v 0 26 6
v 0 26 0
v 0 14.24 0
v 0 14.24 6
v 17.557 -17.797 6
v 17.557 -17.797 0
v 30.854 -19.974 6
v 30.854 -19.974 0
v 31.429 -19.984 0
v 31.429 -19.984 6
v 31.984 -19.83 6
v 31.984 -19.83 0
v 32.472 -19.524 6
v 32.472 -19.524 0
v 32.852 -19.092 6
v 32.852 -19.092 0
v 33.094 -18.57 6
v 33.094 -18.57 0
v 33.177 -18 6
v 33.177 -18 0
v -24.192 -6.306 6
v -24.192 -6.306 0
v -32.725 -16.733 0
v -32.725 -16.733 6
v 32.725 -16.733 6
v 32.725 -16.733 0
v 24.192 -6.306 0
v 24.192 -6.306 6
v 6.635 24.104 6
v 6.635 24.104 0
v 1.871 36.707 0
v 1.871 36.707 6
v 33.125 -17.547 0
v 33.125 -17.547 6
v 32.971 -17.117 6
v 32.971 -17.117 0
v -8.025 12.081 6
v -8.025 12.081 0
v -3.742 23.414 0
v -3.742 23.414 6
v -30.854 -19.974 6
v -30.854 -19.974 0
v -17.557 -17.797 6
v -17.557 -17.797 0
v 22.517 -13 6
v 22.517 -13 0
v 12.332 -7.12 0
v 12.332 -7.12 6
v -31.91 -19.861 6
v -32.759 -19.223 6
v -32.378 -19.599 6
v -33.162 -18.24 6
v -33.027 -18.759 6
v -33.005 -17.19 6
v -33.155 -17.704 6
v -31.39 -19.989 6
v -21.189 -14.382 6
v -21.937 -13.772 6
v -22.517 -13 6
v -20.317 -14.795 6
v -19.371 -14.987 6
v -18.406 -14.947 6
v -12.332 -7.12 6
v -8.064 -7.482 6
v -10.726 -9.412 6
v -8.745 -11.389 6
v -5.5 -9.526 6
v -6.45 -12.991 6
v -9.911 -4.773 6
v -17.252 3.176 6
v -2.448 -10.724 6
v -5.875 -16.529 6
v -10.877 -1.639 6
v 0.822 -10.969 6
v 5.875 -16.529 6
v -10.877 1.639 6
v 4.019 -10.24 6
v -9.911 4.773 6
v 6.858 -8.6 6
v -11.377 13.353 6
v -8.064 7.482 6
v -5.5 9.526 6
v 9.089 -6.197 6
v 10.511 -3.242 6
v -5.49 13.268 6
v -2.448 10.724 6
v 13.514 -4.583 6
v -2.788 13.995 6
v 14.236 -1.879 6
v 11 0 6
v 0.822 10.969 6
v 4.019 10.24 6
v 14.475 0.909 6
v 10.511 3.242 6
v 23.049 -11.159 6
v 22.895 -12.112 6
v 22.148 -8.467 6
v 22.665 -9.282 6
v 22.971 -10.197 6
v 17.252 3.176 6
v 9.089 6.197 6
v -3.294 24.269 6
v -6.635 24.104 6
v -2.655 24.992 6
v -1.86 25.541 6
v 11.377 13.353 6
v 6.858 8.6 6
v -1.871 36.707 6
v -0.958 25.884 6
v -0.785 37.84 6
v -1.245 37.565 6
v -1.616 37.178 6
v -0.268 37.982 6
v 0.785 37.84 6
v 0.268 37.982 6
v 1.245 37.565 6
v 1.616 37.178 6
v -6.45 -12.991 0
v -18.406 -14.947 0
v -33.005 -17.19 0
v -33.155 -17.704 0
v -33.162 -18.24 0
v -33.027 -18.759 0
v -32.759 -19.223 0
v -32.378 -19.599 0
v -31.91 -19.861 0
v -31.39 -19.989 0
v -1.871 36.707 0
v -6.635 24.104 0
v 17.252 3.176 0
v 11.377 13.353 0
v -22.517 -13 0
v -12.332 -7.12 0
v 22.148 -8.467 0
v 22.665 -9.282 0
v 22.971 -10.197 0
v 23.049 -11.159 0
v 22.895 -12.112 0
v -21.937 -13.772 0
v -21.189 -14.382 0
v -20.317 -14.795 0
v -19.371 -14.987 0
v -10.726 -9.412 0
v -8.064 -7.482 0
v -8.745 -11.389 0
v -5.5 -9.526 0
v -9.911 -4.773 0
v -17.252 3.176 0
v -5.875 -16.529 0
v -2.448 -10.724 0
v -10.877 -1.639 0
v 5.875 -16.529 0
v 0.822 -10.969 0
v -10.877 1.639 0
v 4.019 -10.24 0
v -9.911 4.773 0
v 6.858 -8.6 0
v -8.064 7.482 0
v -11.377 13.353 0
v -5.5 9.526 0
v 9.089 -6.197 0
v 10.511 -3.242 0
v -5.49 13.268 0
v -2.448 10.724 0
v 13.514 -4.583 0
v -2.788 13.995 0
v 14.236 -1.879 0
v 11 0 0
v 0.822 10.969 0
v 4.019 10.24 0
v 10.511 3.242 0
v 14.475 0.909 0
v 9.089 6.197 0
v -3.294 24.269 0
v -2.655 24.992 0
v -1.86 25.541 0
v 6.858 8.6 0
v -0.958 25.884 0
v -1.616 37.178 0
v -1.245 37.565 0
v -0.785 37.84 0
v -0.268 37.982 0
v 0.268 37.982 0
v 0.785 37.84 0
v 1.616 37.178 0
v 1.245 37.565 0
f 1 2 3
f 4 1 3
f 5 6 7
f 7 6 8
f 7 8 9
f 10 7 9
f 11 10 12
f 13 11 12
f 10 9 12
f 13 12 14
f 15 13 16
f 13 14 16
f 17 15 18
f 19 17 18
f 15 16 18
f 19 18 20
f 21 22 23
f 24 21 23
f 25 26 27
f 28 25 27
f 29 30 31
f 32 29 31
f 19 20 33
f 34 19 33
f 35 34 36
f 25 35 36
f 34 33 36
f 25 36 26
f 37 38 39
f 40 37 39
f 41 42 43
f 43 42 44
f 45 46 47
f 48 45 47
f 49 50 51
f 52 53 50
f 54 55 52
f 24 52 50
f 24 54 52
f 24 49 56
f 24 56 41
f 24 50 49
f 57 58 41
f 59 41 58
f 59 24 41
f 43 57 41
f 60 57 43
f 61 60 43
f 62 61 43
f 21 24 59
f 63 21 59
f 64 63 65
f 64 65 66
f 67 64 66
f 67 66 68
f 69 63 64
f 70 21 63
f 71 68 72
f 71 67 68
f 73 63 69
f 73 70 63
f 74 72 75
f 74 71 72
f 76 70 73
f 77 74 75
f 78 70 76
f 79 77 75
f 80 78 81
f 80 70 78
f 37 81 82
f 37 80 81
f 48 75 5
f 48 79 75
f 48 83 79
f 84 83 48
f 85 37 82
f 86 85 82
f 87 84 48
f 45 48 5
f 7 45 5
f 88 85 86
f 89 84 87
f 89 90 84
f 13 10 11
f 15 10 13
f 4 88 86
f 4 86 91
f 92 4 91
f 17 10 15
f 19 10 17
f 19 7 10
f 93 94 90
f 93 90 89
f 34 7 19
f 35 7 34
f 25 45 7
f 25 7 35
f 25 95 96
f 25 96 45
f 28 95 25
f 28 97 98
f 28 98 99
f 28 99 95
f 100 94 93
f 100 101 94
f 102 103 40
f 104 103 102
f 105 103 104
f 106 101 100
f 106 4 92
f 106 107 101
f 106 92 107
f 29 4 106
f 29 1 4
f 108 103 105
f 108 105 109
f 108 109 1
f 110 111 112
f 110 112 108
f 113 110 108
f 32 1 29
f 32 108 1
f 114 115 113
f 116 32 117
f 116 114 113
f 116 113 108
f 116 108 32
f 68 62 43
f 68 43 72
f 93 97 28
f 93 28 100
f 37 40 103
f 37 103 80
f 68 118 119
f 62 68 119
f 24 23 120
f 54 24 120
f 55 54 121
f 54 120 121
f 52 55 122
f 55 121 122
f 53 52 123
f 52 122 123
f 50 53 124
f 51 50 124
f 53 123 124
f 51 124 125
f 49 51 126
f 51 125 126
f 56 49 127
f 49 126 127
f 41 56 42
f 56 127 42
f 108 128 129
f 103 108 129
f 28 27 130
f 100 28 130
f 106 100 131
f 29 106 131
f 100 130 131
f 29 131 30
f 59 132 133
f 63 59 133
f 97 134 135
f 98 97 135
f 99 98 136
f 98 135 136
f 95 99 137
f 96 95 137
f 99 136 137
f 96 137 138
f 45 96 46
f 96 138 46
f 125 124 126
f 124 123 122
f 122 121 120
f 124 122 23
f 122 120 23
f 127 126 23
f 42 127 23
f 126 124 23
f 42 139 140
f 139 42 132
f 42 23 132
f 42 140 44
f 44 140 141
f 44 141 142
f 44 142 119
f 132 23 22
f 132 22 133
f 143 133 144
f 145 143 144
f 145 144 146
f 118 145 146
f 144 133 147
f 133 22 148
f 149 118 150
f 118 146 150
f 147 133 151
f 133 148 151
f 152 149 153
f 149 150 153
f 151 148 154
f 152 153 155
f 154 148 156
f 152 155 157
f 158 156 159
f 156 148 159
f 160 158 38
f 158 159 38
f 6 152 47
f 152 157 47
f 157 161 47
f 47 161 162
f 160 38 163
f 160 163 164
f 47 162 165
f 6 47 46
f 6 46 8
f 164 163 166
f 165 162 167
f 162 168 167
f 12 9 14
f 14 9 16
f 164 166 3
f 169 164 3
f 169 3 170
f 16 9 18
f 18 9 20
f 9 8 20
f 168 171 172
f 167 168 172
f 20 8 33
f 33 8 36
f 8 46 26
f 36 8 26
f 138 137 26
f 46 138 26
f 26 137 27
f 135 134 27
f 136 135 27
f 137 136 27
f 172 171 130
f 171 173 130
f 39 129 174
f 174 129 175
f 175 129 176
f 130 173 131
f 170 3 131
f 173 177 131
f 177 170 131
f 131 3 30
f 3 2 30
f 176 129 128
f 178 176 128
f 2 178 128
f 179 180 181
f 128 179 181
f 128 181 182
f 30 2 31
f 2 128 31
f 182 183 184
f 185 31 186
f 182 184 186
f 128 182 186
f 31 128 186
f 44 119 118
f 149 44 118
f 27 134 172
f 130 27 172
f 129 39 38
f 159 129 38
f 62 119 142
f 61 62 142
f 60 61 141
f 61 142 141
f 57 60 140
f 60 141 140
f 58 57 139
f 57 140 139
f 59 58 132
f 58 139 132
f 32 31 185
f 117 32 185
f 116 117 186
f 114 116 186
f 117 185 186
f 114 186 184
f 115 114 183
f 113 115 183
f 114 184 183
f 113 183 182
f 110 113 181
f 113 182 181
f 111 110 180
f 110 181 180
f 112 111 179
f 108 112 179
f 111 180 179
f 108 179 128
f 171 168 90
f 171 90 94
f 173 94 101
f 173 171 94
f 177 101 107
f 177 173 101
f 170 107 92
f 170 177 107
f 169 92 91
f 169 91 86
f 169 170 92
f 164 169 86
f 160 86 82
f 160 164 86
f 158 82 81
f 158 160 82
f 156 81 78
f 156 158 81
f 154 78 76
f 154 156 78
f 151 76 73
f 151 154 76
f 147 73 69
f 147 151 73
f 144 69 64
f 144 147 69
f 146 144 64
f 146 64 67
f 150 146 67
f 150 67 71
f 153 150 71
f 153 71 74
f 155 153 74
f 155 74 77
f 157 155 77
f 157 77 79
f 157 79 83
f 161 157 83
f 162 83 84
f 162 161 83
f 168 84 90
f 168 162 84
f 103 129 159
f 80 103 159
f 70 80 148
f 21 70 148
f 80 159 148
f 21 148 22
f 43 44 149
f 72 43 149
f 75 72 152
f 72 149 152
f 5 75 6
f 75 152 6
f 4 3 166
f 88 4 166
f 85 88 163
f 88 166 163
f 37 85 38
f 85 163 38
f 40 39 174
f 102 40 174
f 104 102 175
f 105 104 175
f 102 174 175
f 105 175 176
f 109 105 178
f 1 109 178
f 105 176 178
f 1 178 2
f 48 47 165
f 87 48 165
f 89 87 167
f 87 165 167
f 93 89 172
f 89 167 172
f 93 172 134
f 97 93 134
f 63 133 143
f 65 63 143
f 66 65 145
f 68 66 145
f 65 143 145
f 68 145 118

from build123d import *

# Parameters (mm, degrees)
F0_R     = 11
F1_DEPTH = 6


# Not quite as in the source:
# - a feature names something its author has since deleted; it is built from what else it names


with BuildPart() as f1:
    # F0 (on Top) → F1 (new body)
    with BuildSketch(Plane.XY):
        with BuildLine():
            ThreePointArc((1.8708277189, 36.7071093595), (1.9674419226, 36.3594054551), (2, 36))
            ThreePointArc((2, 36), (-0.3594054551, 34.0325580774), (-1.8708277189, 36.7071093595))
            Line((-1.8708277189, 36.7071093595), (-6.6345304801, 24.1035890545))
            ThreePointArc((-6.6345304801, 24.1035890545), (-14.1770019873, 8.1850959137), (-24.1915856836, -6.3061225893))
            Line((-24.1915856836, -6.3061225893), (-32.7247030643, -16.7333703491))
            ThreePointArc((-32.7247030643, -16.7333703491), (-30.5044478293, -16.116442587), (-29.1769145362, -18))
            ThreePointArc((-29.1769145362, -18), (-29.6527625783, -19.2949752156), (-30.8538753454, -19.9737390104))
            Line((-30.8538753454, -19.9737390104), (-17.5570552035, -17.7974664652))
            ThreePointArc((-17.5570552035, -17.7974664652), (0, -16.3701918273), (17.5570552035, -17.7974664652))
            Line((17.5570552035, -17.7974664652), (30.8538753454, -19.9737390104))
            ThreePointArc((30.8538753454, -19.9737390104), (29.4448637287, -17), (32.7247030643, -16.7333703491))
            Line((32.7247030643, -16.7333703491), (24.1915856836, -6.3061225893))
            ThreePointArc((24.1915856836, -6.3061225893), (14.1770019873, 8.1850959137), (6.6345304801, 24.1035890545))
            Line((6.6345304801, 24.1035890545), (1.8708277189, 36.7071093595))
        make_face()
        with BuildLine():
            ThreePointArc((-18.4064805015, -14.9474780208), (-20.765299785, -14.6147639762), (-22.5166604984, -13))
            Line((-22.5166604984, -13), (-12.3317924474, -7.1197636891))
            ThreePointArc((-12.3317924474, -7.1197636891), (-9.7788523145, -10.4437050957), (-6.4502961482, -12.9906255195))
            Line((-6.4502961482, -12.9906255195), (-18.4064805015, -14.9474780208))
        make_face(mode=Mode.SUBTRACT)
        with BuildLine():
            ThreePointArc((22.1481359393, -8.4667406982), (23.0394067662, -10.6758951429), (22.5166604984, -13))
            Line((22.5166604984, -13), (12.3317924474, -7.1197636891))
            ThreePointArc((12.3317924474, -7.1197636891), (13.9339400798, -3.2468819763), (14.4753597851, 0.9091924335))
            Line((14.4753597851, 0.9091924335), (22.1481359393, -8.4667406982))
        make_face(mode=Mode.SUBTRACT)
        Circle(F0_R, mode=Mode.SUBTRACT)
        with BuildLine():
            ThreePointArc((-3.7416554378, 23.414218719), (-2.2741069812, 25.2906591191), (0, 26))
            Line((0, 26), (0, 14.2395273782))
            ThreePointArc((0, 14.2395273782), (-4.1550877653, 13.6905870721), (-8.0250636368, 12.0814330861))
            Line((-8.0250636368, 12.0814330861), (-3.7416554378, 23.414218719))
        make_face(mode=Mode.SUBTRACT)
        with BuildLine():
            ThreePointArc((-1.8708277189, 36.7071093595), (-0.3594054551, 34.0325580774), (2, 36))
            ThreePointArc((2, 36), (1.9674419226, 36.3594054551), (1.8708277189, 36.7071093595))
            ThreePointArc((1.8708277189, 36.7071093595), (0, 38), (-1.8708277189, 36.7071093595))
        make_face()
        with BuildLine():
            ThreePointArc((33.1769145362, -18), (33.0604719492, -17.327533293), (32.7247030643, -16.7333703491))
            ThreePointArc((32.7247030643, -16.7333703491), (29.4448637287, -17), (30.8538753454, -19.9737390104))
            ThreePointArc((30.8538753454, -19.9737390104), (32.4718897519, -19.5241519579), (33.1769145362, -18))
        make_face()
        with BuildLine():
            ThreePointArc((-29.1769145362, -18), (-30.5044478293, -16.116442587), (-32.7247030643, -16.7333703491))
            ThreePointArc((-32.7247030643, -16.7333703491), (-32.9089653438, -19), (-30.8538753454, -19.9737390104))
            ThreePointArc((-30.8538753454, -19.9737390104), (-29.6527625783, -19.2949752156), (-29.1769145362, -18))
        make_face()
    extrude(amount=F1_DEPTH)


solid = f1.part
